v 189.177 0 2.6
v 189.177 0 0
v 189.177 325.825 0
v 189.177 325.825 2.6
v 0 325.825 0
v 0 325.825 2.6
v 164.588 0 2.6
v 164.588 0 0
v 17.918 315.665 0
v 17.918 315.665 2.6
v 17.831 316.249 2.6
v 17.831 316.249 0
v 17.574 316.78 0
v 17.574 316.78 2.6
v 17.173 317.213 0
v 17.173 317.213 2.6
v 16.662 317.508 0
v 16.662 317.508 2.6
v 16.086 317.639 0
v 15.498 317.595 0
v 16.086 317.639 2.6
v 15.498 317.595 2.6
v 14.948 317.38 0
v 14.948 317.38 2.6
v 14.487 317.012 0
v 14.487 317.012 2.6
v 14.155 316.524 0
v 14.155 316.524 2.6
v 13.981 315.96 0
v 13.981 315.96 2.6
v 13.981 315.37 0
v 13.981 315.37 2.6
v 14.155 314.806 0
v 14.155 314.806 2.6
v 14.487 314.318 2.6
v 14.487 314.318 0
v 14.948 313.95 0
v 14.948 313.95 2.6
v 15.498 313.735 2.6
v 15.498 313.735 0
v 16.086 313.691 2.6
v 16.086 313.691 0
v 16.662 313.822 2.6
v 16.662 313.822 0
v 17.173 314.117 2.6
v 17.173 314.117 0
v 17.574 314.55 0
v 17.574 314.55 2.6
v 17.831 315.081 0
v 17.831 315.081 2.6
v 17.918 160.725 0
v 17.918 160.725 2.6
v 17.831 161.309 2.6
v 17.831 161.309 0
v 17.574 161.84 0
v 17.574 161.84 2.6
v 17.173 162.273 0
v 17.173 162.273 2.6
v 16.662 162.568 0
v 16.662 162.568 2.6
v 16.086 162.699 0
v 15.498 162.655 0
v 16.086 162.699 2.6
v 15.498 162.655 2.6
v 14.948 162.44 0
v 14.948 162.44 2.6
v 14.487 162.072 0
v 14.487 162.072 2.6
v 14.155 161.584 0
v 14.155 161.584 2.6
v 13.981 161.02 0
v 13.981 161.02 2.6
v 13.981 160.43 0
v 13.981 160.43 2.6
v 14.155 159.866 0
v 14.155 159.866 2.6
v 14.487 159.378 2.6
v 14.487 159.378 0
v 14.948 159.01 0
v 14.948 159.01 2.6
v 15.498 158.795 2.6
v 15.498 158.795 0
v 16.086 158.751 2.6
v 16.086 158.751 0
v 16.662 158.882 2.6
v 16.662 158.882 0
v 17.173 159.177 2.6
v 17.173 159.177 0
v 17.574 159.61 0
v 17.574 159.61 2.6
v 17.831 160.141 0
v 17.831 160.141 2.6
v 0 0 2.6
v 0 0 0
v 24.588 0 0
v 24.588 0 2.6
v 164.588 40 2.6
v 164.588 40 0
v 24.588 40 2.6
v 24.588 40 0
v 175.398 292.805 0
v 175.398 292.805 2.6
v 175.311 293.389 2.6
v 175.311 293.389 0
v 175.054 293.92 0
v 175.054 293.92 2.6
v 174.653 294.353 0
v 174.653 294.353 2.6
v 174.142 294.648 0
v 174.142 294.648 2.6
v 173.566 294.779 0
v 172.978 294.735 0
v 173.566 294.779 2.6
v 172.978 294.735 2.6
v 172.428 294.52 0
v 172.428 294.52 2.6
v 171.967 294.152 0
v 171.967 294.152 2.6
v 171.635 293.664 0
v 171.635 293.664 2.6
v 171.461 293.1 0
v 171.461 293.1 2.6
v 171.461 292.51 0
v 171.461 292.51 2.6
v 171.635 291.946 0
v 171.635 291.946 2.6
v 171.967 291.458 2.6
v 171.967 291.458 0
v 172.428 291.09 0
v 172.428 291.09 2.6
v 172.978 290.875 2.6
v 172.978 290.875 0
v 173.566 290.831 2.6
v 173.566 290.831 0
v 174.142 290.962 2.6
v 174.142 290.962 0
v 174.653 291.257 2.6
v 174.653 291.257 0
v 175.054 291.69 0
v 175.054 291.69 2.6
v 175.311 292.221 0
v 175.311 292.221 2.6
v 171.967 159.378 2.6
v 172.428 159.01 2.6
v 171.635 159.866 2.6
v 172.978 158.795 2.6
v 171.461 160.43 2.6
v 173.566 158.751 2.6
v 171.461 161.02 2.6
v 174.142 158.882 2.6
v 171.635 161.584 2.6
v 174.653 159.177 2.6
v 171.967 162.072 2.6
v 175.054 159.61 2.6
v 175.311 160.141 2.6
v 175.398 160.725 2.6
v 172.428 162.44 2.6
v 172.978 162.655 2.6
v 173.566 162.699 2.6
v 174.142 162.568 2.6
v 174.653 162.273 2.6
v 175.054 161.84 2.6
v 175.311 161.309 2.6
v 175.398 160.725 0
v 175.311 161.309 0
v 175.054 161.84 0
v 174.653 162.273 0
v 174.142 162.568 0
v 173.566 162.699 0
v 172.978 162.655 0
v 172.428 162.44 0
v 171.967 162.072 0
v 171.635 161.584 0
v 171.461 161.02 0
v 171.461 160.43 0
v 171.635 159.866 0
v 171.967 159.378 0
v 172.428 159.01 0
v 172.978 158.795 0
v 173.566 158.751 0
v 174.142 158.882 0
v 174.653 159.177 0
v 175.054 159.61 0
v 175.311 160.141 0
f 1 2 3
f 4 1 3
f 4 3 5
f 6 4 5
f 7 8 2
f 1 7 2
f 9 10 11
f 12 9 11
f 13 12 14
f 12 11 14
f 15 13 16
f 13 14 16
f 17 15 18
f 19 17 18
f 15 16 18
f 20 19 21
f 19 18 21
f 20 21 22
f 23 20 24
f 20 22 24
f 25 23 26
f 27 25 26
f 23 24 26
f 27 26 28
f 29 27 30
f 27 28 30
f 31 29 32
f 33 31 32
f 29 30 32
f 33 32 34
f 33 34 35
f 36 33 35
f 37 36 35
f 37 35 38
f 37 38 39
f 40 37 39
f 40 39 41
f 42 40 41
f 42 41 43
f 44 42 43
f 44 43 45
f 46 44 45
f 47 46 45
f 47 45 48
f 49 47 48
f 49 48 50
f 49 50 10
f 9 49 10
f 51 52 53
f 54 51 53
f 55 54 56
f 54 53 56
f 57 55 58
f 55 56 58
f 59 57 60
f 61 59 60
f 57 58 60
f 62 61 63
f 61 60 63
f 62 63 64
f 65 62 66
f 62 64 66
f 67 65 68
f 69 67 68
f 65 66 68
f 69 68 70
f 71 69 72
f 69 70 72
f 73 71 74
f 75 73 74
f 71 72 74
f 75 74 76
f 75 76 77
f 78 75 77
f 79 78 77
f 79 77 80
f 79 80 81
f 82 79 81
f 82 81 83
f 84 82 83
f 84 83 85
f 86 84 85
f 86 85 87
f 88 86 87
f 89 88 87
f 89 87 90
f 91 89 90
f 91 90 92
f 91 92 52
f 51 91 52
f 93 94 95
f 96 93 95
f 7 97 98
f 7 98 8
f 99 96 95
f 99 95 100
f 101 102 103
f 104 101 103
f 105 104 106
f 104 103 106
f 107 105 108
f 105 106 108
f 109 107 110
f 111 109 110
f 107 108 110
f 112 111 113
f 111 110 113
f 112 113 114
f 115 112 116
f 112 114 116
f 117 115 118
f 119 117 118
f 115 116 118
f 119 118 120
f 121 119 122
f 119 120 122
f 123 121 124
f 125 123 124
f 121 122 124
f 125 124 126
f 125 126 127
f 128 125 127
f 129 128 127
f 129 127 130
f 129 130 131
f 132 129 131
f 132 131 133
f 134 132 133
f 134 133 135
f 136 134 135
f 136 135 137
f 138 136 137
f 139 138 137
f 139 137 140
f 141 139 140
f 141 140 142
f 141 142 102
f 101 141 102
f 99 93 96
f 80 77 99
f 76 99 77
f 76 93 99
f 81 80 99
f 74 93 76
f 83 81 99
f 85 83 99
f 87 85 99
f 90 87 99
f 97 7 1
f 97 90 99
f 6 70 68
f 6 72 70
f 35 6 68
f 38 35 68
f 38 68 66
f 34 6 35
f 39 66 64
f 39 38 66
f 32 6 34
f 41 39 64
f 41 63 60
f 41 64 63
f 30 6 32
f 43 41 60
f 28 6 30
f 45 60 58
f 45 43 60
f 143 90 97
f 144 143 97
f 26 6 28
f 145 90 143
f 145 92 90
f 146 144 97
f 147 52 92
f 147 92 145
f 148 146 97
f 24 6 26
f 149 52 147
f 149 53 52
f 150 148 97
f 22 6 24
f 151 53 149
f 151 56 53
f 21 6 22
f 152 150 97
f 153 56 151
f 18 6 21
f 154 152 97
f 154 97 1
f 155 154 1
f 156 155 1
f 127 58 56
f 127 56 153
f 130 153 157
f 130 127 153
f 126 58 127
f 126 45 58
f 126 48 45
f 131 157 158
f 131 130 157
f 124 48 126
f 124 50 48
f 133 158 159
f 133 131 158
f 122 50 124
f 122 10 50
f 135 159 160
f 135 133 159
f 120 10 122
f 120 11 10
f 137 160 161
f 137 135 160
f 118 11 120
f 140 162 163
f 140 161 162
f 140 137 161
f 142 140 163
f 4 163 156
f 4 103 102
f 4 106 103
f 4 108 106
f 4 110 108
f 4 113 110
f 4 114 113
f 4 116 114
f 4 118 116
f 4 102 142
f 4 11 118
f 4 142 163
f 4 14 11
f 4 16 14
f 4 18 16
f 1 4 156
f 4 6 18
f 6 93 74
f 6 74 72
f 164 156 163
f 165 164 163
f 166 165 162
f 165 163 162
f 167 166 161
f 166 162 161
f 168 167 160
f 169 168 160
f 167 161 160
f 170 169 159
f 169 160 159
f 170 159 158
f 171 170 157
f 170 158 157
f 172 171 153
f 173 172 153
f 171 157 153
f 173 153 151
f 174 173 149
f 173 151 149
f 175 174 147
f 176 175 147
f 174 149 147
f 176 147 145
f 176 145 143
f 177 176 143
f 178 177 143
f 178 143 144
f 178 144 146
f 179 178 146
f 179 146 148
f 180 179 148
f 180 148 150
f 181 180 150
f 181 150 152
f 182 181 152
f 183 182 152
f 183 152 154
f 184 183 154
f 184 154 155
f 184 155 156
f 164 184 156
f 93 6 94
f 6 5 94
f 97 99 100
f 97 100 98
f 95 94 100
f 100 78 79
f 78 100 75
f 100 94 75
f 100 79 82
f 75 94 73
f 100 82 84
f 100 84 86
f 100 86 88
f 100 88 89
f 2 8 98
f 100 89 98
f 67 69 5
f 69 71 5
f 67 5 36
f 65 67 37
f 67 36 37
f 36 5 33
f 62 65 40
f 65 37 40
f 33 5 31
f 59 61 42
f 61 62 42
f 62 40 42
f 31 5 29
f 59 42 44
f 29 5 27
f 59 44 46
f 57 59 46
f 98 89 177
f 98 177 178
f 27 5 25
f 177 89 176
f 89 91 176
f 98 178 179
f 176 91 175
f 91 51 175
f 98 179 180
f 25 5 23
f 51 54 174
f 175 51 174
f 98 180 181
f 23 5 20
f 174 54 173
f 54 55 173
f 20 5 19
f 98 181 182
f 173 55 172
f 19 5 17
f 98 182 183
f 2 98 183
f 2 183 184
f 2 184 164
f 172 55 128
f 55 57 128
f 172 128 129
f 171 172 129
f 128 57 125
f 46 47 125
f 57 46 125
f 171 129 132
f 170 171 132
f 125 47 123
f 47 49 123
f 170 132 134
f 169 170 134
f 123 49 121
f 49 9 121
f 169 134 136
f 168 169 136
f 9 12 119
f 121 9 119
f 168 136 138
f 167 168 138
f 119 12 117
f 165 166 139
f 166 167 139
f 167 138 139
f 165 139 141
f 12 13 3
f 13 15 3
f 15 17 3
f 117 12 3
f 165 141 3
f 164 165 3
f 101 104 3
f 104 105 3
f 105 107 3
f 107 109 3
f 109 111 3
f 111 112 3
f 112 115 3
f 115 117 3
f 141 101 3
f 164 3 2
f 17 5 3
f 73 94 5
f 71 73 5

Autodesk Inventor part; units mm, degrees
ref_plane "YZ Plane" through (0, 0, 0) normal (1, 0, 0) x (0, 1, 0)
ref_plane "XZ Plane" through (0, 0, 0) normal (0, 1, 0) x (-1, 0, 0)
ref_plane "XY Plane" through (0, 0, 0) normal (0, 0, 1) x (1, 0, 0)
sketch "Sketch1" plane through (0, 0, 0) normal (0, 0, 1) x (1, 0, 0)
  line L0 (0, 0) -> (189.177, 0)
  line L1 (189.177, 0) -> (189.177, 325.825)
  line L2 (189.177, 325.825) -> (0, 325.825)
  line L3 (0, 325.825) -> (0, 0)
  dimension "d0" = 189.177
  dimension "d1" = 325.825
extrude "Extrusion1" add sketch "Sketch1" along normal blind 2.6
sketch "Sketch2" plane through (0, 0, 2.6) normal (0, 0, 1) x (1, 0, 0)
  line L0 (0, 325.825) -> (0, 0) projected
  line L1 (0, 170) -> (0, 0)
  line L2 (0, 170) -> (0, 159.84) construction
  line L3 (0, 159.84) -> (6.35, 159.84) construction
  line L4 (6.35, 170) -> (163.83, 170) construction
  line L5 (163.83, 170) -> (163.83, 136.98) construction
  line L6 (6.35, 159.84) -> (6.35, 4.9) construction
  line L7 (6.35, 4.9) -> (163.83, 4.9) construction
  line L8 (6.35, 159.84) -> (15.9385, 159.84) construction
  line L9 (15.9385, 159.84) -> (15.9385, 4.9) construction
  line L10 (163.83, 136.98) -> (173.4185, 136.98) construction
  line L11 (173.4185, 136.98) -> (173.4185, 4.9) construction
  line L12 (0, 325.825) -> (0, 315.665) construction
  line L13 (15.9385, 159.84) -> (15.9385, 315.665) construction
  line L14 (173.4185, 136.98) -> (173.4185, 292.805) construction
  line L15 (15.9385, 4.9) -> (15.9385, 160.725) construction
  line L16 (173.4185, 4.9) -> (173.4185, 160.725) construction
  circle A0 centre (173.4185, 160.725) radius 1.98
  circle A1 centre (15.9385, 160.725) radius 1.98
  circle A2 centre (15.9385, 315.665) radius 1.98
  circle A3 centre (173.4185, 292.805) radius 1.98
  dimension "d4" = 10.16
  dimension "d6" = 157.48
  dimension "d7" = 33.02
  dimension "d8" = 154.94
  dimension "d13" = 9.5885
  dimension "d14" = 9.5885
  dimension "d19" = 10.16
  dimension "d20" = 155.825
  dimension "d21" = 155.825
  dimension "d22" = 155.825
  dimension "d23" = 3.96
  dimension "d24" = 3.96
  dimension "d25" = 3.96
  dimension "d26" = 3.96
extrude "Extrusion2" cut sketch "Sketch2" against normal blind 5
sketch "Sketch4" plane through (0, 0, 2.6) normal (0, 0, 1) x (1, 0, 0)
  line L0 (0, 0) -> (189.177, 0) projected
  line L1 (189.177, 0) -> (164.5885, 0) construction
  line L2 (164.5885, 0) -> (24.5885, 0)
  line L3 (24.5885, 0) -> (24.5885, 40)
  line L4 (24.5885, 40) -> (164.5885, 40)
  line L5 (164.5885, 40) -> (164.5885, 0)
  dimension "d29" = 24.5885
  dimension "d30" = 140
  dimension "d31" = 40
extrude "Extrusion3" cut sketch "Sketch4" against normal blind 10
properties part number "trunk"
